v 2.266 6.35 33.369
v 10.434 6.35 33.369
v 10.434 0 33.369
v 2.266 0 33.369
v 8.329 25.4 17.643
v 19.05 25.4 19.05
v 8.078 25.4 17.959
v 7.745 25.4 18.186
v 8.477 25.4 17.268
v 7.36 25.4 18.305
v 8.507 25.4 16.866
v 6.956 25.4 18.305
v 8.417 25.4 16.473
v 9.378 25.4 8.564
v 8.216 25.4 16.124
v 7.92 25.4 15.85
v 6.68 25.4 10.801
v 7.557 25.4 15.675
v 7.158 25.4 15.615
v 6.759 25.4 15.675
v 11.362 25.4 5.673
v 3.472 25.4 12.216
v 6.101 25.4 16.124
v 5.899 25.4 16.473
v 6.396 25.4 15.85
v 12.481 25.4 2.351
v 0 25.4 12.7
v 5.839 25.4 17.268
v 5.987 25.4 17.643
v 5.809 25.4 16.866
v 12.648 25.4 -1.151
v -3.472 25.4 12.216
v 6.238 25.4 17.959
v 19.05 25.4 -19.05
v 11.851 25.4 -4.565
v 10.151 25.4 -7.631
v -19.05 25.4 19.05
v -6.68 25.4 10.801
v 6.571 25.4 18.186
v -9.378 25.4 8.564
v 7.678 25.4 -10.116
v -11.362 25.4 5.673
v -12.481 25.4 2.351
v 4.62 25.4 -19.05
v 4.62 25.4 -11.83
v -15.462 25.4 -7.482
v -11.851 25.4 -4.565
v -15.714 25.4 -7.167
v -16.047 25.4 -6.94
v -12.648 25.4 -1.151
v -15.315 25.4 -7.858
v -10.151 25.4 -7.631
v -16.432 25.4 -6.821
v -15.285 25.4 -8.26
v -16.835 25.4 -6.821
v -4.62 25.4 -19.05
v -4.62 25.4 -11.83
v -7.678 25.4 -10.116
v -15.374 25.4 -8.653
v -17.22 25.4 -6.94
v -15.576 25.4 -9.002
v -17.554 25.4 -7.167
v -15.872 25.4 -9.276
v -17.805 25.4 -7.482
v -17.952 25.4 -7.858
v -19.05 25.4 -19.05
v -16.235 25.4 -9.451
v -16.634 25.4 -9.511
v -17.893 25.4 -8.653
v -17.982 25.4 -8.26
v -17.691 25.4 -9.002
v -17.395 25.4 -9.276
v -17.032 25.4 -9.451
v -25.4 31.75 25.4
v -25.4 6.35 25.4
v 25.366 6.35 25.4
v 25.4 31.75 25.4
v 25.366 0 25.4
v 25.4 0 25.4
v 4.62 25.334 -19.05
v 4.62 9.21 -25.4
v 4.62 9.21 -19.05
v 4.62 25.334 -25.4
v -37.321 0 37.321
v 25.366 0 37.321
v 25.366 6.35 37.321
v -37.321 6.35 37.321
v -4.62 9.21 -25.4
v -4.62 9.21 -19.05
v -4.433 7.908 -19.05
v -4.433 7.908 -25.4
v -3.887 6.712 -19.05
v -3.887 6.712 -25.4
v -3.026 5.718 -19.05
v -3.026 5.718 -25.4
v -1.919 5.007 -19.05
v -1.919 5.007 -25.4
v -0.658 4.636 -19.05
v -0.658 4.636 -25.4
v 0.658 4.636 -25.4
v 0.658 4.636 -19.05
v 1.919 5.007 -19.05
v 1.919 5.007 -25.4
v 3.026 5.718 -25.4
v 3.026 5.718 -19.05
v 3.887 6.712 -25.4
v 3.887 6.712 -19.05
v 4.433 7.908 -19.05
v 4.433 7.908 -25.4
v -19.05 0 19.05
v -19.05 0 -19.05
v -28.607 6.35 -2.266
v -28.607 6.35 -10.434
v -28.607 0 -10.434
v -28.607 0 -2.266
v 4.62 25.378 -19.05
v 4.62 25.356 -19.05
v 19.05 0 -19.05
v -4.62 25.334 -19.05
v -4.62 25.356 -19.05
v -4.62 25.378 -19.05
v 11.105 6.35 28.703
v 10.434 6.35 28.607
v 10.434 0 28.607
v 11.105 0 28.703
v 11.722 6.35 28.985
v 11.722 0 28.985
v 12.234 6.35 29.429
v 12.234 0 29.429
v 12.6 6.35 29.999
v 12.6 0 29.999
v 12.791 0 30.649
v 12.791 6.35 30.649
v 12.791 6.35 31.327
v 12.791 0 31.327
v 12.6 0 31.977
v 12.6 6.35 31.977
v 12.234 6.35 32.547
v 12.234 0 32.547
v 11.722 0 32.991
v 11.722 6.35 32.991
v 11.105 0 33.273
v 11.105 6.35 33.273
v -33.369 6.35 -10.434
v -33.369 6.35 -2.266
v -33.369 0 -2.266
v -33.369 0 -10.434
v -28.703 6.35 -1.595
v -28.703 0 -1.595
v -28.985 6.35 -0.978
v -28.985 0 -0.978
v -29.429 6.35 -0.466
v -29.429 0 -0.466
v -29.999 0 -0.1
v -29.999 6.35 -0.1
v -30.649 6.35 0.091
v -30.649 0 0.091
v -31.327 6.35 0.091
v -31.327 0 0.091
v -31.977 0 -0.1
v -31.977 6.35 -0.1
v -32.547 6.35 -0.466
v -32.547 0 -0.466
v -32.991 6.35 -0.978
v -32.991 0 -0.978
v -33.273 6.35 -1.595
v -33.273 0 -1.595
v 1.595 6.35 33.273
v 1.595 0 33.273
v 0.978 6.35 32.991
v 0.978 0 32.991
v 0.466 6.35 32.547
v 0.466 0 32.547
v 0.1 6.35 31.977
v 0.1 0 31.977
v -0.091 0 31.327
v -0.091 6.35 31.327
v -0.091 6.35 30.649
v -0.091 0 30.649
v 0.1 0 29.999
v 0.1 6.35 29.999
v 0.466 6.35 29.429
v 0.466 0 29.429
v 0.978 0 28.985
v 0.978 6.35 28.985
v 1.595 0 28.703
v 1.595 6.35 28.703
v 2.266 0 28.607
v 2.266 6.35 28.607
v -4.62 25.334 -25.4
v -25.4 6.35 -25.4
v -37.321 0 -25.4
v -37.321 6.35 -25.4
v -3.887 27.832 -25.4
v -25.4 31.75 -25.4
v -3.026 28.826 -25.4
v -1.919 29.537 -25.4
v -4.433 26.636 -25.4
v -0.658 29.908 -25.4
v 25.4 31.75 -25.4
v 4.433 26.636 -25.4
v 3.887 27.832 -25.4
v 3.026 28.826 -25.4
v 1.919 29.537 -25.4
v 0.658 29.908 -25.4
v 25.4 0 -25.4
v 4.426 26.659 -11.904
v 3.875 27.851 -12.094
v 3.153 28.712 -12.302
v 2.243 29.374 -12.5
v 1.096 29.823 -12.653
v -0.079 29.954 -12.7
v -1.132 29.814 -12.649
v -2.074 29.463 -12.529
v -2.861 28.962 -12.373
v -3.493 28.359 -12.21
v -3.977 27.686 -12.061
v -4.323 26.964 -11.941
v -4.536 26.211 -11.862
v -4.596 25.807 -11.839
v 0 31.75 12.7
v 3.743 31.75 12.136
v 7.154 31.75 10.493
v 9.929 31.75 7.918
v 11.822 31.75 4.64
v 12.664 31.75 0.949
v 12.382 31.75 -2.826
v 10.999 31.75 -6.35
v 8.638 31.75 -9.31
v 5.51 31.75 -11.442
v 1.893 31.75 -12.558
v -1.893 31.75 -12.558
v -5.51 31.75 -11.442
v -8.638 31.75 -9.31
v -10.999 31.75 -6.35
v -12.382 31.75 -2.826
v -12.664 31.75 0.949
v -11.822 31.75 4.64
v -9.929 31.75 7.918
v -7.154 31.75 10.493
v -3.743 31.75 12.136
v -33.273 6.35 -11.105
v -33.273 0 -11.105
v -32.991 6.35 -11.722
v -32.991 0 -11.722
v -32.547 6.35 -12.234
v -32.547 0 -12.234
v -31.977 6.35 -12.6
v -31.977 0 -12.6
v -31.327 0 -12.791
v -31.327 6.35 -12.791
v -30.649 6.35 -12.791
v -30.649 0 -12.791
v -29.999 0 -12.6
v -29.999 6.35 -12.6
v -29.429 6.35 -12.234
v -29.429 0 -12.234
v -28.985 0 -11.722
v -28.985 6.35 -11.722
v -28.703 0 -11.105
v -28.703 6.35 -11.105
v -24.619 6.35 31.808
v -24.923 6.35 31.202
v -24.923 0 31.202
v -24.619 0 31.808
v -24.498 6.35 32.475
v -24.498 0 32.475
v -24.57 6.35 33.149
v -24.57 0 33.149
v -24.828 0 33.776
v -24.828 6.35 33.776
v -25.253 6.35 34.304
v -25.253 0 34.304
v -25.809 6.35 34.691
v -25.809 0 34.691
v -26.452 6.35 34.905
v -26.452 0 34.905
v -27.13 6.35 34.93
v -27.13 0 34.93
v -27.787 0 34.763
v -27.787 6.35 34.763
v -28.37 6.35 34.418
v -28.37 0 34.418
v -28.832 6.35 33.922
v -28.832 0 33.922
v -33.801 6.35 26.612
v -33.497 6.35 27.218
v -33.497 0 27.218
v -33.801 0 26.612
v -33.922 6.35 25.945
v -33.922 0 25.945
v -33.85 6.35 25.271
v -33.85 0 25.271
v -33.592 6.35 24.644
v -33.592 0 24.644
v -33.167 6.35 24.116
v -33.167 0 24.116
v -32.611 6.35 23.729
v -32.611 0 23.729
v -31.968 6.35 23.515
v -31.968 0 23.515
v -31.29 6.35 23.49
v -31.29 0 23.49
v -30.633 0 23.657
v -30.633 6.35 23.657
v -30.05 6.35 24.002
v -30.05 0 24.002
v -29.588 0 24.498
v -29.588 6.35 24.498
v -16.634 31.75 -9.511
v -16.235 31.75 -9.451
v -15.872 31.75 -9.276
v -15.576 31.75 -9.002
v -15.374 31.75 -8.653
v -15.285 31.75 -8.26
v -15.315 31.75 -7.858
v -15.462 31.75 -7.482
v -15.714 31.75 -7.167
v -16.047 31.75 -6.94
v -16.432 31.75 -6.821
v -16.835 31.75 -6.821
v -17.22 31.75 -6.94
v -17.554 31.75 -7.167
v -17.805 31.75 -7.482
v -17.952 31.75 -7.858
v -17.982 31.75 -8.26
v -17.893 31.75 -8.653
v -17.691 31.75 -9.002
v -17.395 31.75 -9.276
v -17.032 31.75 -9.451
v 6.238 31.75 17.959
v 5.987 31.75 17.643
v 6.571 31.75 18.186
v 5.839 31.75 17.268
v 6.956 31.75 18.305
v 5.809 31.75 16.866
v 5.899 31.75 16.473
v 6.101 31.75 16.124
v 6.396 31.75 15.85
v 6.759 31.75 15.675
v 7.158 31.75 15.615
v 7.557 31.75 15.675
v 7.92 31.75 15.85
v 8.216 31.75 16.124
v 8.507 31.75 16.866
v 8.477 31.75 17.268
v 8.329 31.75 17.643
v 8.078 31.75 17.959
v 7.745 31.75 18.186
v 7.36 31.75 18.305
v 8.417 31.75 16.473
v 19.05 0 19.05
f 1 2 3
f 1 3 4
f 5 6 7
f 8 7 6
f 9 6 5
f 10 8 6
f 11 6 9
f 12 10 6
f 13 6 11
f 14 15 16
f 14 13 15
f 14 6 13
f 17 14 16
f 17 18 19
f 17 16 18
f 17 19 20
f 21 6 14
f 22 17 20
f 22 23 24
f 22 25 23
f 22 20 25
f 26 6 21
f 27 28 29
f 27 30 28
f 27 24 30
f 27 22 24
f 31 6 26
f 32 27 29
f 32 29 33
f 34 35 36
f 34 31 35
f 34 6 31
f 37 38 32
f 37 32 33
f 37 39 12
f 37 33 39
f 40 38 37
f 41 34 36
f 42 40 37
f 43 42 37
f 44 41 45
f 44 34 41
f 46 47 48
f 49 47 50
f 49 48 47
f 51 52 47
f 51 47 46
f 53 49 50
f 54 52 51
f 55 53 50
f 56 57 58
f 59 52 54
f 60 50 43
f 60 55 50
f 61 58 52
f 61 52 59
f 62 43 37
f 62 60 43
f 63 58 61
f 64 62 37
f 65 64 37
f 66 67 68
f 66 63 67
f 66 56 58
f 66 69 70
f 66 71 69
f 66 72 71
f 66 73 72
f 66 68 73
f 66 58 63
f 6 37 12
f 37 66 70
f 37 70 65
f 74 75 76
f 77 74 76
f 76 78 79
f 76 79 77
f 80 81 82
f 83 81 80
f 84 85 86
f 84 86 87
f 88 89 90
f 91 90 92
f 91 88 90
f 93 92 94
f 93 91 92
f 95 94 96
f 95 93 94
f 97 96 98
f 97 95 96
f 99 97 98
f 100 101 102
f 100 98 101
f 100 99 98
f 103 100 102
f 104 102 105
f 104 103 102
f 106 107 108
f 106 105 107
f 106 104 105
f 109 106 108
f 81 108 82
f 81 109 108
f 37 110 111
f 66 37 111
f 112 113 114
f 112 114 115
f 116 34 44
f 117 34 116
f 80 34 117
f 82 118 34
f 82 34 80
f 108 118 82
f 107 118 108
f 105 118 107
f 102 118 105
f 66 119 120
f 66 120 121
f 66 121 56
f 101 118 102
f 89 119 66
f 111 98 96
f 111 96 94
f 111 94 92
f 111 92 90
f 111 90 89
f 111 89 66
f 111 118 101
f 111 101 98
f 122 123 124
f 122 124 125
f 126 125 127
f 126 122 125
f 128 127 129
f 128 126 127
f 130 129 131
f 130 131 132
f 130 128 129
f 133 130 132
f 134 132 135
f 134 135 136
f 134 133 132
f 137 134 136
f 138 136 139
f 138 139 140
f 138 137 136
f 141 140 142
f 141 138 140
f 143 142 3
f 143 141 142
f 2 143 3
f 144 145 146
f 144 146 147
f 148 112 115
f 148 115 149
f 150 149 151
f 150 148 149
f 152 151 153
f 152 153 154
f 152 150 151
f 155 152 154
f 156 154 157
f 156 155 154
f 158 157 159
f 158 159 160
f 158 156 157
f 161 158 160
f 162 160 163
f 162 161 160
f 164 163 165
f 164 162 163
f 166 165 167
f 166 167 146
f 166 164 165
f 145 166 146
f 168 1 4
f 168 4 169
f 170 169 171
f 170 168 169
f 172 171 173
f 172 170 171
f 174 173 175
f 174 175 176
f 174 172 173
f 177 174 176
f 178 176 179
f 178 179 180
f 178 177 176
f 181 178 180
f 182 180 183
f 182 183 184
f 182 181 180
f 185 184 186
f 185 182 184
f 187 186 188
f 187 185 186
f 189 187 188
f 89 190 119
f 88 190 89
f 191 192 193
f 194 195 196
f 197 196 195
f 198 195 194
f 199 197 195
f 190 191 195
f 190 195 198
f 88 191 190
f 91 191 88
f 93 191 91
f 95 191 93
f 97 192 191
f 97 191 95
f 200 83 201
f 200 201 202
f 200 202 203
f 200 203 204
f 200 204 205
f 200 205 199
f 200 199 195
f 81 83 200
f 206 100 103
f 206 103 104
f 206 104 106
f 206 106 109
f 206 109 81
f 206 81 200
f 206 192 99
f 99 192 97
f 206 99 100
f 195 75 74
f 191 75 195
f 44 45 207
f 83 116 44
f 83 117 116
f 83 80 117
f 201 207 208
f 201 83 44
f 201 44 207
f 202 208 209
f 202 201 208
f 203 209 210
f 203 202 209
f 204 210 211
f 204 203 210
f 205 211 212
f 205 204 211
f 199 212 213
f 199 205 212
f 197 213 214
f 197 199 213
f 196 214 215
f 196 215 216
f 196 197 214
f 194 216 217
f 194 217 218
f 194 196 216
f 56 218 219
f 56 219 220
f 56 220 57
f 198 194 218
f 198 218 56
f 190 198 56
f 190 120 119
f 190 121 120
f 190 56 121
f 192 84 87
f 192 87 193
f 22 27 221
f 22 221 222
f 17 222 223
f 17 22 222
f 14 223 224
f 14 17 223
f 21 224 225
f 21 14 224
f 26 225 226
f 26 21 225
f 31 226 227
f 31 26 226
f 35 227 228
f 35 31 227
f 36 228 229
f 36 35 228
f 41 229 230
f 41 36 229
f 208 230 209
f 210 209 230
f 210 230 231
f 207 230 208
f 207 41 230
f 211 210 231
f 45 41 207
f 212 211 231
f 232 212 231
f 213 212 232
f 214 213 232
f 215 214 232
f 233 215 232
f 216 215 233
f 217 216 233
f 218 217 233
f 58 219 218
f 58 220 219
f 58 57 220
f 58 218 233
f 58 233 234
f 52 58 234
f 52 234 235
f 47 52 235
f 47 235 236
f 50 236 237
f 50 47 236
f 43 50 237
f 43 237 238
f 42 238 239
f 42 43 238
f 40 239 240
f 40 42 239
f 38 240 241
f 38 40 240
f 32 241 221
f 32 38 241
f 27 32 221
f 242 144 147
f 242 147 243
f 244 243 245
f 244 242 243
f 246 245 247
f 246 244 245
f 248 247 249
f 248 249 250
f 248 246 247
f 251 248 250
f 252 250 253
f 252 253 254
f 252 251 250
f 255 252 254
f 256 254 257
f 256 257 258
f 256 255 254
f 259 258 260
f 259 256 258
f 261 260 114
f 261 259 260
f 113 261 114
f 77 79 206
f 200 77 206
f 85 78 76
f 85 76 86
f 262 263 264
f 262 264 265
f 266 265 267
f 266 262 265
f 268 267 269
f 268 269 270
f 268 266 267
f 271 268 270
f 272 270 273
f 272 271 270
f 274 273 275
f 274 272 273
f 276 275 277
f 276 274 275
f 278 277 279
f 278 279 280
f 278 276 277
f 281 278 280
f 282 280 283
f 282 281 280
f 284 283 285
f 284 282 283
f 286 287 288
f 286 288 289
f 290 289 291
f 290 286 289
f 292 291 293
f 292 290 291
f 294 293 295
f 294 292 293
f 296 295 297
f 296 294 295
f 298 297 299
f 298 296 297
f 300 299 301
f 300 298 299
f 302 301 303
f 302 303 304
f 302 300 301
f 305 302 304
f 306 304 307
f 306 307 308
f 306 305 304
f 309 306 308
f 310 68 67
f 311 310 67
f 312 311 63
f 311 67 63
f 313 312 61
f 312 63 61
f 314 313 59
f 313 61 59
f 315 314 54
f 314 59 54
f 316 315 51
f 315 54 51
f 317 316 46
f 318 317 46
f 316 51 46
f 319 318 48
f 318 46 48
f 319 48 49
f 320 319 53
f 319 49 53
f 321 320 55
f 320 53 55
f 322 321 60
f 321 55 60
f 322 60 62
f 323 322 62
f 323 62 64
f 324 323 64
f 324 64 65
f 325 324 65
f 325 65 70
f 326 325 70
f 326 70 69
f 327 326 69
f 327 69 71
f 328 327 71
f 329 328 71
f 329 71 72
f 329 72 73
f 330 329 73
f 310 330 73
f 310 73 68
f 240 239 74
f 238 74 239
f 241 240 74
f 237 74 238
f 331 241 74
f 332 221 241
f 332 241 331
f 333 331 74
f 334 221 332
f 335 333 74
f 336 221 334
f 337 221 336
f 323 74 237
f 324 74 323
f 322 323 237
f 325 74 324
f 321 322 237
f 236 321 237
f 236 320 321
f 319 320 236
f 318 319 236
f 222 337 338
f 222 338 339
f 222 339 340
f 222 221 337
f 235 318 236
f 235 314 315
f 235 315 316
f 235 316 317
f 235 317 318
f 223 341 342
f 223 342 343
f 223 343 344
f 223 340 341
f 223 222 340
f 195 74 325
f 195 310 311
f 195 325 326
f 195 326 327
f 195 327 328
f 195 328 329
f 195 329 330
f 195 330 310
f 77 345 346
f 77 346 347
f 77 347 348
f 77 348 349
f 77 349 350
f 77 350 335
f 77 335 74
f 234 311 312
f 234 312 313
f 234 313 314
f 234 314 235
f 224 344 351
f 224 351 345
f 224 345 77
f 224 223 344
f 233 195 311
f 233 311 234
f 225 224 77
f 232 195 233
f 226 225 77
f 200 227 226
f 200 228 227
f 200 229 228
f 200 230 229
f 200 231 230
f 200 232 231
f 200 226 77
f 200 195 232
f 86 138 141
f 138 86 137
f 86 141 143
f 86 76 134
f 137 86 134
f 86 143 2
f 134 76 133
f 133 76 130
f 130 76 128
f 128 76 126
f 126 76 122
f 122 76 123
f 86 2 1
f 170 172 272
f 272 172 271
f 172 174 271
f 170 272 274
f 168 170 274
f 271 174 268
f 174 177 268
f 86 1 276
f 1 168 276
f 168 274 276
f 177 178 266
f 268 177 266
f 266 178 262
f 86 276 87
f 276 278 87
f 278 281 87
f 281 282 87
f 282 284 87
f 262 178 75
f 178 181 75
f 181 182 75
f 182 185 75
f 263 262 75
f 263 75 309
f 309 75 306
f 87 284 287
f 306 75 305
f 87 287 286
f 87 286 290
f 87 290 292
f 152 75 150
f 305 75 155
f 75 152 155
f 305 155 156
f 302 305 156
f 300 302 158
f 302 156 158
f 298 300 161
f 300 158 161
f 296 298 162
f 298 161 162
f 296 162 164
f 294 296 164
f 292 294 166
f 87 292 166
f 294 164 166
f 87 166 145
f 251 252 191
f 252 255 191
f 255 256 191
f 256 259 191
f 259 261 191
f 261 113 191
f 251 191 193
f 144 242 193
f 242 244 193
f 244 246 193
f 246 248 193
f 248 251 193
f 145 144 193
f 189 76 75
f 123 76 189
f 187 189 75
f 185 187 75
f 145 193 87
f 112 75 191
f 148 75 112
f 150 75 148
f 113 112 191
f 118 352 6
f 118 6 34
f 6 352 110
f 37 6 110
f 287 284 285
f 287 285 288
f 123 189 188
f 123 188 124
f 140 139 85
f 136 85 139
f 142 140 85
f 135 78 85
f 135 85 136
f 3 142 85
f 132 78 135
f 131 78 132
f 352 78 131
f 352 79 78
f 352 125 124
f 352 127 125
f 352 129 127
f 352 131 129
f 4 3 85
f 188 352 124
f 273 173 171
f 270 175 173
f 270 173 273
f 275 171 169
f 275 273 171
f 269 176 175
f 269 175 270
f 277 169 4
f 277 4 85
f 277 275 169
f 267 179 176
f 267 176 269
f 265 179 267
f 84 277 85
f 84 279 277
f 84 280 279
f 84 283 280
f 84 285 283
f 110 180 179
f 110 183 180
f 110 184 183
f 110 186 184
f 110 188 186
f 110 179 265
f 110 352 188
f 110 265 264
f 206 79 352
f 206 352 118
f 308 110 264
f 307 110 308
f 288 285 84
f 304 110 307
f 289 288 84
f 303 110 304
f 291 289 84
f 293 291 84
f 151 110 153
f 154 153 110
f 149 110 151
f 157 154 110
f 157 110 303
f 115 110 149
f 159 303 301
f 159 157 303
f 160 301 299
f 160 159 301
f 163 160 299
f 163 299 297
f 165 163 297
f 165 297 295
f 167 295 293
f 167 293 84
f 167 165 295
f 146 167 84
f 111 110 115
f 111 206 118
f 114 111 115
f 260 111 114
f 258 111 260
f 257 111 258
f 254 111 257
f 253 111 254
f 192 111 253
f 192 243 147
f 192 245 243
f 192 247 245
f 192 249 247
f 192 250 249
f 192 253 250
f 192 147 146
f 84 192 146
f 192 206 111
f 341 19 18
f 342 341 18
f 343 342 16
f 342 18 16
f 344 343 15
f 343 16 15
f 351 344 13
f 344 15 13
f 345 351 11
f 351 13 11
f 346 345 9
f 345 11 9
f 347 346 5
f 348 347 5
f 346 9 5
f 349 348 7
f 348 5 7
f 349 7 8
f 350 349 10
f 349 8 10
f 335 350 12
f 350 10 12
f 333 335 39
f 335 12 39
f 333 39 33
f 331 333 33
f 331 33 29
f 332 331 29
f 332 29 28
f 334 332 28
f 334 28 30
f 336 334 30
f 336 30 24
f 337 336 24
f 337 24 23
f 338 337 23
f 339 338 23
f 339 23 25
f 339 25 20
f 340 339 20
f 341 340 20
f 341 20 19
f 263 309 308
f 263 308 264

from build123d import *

# Parameters (mm, degrees)
SKETCH1_W             = 50.8
SKETCH1_H             = 50.8
SKETCH1_R             = 12.7
BOSS_EXTRUDE2_DEPTH   = 31.75
BOSS_EXTRUDE5_DEPTH   = 6.35
CUT_EXTRUDE2_DEPTH    = 6.35
CUT_EXTRUDE3_DEPTH    = 6.35
SKETCH12_W            = 38.1
SKETCH12_H            = 38.1
CUT_EXTRUDE6_DEPTH    = 25.4
F_6_32_TAPPED_HOLE3_D = 2.7051
CUT_EXTRUDE7_DEPTH    = 25.4


with BuildPart() as part:
    # Sketch1 → Boss-Extrude2 (new body)
    with BuildSketch(Plane(origin=(0, 0, 0), x_dir=(1, 0, 0), z_dir=(0, 1, 0))):
        Rectangle(SKETCH1_W, SKETCH1_H)
        with Locations(Location((0, 0, 0), (0, 0, 270))):
            Circle(SKETCH1_R, mode=Mode.SUBTRACT)
    extrude(amount=BOSS_EXTRUDE2_DEPTH)

    # Sketch4 → Boss-Extrude5 (add)
    with BuildSketch(Plane(origin=(0, 0, 0), x_dir=(-1, 0, 0), z_dir=(0, -1, 0))):
        Polygon((25.4, -25.4), (-25.366380646, -25.4), (-25.366380646, -37.321328202), (37.321328153, -37.321328202), (37.321328153, -25.4), (37.321328153, 25.4), (25.4, 25.4), align=None)
    extrude(amount=-BOSS_EXTRUDE5_DEPTH)

    # Sketch11 → Cut-Extrude2 (cut)
    with BuildSketch(Plane(origin=(0, 6.35, 0), x_dir=(1, 0, 0), z_dir=(0, 1, 0))):
        with BuildLine():
            Line((-28.60675, 10.43410283), (-28.60675, 2.26589717))
            ThreePointArc((-28.60675, 2.26589717), (-30.988, -0.11535283), (-33.36925, 2.26589717))
            Line((-33.36925, 2.26589717), (-33.36925, 10.43410283))
            ThreePointArc((-33.36925, 10.43410283), (-30.988, 12.81535283), (-28.60675, 10.43410283))
        make_face()
        with BuildLine():
            Line((-29.587864683, -24.49752021), (-24.922781552, -31.202487256))
            ThreePointArc((-24.922781552, -31.202487256), (-25.517462167, -34.517160405), (-28.832135317, -33.92247979))
            Line((-28.832135317, -33.92247979), (-33.497218448, -27.217512744))
            ThreePointArc((-33.497218448, -27.217512744), (-32.902537833, -23.902839595), (-29.587864683, -24.49752021))
        make_face()
    extrude(amount=-CUT_EXTRUDE2_DEPTH, mode=Mode.SUBTRACT)

    # Sketch10 → Cut-Extrude3 (cut)
    with BuildSketch(Plane(origin=(0, 6.35, 0), x_dir=(1, 0, 0), z_dir=(0, 1, 0))):
        with BuildLine():
            Line((10.434102814, -33.36925), (2.265897186, -33.36925))
            ThreePointArc((2.265897186, -33.36925), (-0.115352814, -30.988), (2.265897186, -28.60675))
            Line((2.265897186, -28.60675), (10.434102814, -28.60675))
            ThreePointArc((10.434102814, -28.60675), (12.815352814, -30.988), (10.434102814, -33.36925))
        make_face()
    extrude(amount=-CUT_EXTRUDE3_DEPTH, mode=Mode.SUBTRACT)

    # Sketch12 → Cut-Extrude6 (cut)
    with BuildSketch(Plane(origin=(0, 0, 0), x_dir=(-1, 0, 0), z_dir=(0, -1, 0))):
        Rectangle(SKETCH12_W, SKETCH12_H)
    extrude(amount=-CUT_EXTRUDE6_DEPTH, mode=Mode.SUBTRACT)

    # #6-32 Tapped Hole3 (through all)
    with Locations(Plane(origin=(7.158073922, 31.75, 16.96706293), x_dir=(0, 0, 1), z_dir=(0, 1, 0))):
        with Locations((0, 0), (-25.125718539, -23.79160959)):
            Hole(F_6_32_TAPPED_HOLE3_D / 2)

    # Sketch18 → Cut-Extrude7 (cut)
    with BuildSketch(Plane(origin=(0, 0, -25.4), x_dir=(-1, 0, 0), z_dir=(0, 0, -1))):
        with BuildLine():
            Line((4.620408953, 25.334287556), (4.620408953, 9.209712444))
            ThreePointArc((4.620408953, 9.209712444), (0, 4.589303492), (-4.620408953, 9.209712444))
            Line((-4.620408953, 9.209712444), (-4.620408953, 25.334287556))
            ThreePointArc((-4.620408953, 25.334287556), (0, 29.954696508), (4.620408953, 25.334287556))
        make_face()
    extrude(amount=-CUT_EXTRUDE7_DEPTH, mode=Mode.SUBTRACT)


solid = part.part
